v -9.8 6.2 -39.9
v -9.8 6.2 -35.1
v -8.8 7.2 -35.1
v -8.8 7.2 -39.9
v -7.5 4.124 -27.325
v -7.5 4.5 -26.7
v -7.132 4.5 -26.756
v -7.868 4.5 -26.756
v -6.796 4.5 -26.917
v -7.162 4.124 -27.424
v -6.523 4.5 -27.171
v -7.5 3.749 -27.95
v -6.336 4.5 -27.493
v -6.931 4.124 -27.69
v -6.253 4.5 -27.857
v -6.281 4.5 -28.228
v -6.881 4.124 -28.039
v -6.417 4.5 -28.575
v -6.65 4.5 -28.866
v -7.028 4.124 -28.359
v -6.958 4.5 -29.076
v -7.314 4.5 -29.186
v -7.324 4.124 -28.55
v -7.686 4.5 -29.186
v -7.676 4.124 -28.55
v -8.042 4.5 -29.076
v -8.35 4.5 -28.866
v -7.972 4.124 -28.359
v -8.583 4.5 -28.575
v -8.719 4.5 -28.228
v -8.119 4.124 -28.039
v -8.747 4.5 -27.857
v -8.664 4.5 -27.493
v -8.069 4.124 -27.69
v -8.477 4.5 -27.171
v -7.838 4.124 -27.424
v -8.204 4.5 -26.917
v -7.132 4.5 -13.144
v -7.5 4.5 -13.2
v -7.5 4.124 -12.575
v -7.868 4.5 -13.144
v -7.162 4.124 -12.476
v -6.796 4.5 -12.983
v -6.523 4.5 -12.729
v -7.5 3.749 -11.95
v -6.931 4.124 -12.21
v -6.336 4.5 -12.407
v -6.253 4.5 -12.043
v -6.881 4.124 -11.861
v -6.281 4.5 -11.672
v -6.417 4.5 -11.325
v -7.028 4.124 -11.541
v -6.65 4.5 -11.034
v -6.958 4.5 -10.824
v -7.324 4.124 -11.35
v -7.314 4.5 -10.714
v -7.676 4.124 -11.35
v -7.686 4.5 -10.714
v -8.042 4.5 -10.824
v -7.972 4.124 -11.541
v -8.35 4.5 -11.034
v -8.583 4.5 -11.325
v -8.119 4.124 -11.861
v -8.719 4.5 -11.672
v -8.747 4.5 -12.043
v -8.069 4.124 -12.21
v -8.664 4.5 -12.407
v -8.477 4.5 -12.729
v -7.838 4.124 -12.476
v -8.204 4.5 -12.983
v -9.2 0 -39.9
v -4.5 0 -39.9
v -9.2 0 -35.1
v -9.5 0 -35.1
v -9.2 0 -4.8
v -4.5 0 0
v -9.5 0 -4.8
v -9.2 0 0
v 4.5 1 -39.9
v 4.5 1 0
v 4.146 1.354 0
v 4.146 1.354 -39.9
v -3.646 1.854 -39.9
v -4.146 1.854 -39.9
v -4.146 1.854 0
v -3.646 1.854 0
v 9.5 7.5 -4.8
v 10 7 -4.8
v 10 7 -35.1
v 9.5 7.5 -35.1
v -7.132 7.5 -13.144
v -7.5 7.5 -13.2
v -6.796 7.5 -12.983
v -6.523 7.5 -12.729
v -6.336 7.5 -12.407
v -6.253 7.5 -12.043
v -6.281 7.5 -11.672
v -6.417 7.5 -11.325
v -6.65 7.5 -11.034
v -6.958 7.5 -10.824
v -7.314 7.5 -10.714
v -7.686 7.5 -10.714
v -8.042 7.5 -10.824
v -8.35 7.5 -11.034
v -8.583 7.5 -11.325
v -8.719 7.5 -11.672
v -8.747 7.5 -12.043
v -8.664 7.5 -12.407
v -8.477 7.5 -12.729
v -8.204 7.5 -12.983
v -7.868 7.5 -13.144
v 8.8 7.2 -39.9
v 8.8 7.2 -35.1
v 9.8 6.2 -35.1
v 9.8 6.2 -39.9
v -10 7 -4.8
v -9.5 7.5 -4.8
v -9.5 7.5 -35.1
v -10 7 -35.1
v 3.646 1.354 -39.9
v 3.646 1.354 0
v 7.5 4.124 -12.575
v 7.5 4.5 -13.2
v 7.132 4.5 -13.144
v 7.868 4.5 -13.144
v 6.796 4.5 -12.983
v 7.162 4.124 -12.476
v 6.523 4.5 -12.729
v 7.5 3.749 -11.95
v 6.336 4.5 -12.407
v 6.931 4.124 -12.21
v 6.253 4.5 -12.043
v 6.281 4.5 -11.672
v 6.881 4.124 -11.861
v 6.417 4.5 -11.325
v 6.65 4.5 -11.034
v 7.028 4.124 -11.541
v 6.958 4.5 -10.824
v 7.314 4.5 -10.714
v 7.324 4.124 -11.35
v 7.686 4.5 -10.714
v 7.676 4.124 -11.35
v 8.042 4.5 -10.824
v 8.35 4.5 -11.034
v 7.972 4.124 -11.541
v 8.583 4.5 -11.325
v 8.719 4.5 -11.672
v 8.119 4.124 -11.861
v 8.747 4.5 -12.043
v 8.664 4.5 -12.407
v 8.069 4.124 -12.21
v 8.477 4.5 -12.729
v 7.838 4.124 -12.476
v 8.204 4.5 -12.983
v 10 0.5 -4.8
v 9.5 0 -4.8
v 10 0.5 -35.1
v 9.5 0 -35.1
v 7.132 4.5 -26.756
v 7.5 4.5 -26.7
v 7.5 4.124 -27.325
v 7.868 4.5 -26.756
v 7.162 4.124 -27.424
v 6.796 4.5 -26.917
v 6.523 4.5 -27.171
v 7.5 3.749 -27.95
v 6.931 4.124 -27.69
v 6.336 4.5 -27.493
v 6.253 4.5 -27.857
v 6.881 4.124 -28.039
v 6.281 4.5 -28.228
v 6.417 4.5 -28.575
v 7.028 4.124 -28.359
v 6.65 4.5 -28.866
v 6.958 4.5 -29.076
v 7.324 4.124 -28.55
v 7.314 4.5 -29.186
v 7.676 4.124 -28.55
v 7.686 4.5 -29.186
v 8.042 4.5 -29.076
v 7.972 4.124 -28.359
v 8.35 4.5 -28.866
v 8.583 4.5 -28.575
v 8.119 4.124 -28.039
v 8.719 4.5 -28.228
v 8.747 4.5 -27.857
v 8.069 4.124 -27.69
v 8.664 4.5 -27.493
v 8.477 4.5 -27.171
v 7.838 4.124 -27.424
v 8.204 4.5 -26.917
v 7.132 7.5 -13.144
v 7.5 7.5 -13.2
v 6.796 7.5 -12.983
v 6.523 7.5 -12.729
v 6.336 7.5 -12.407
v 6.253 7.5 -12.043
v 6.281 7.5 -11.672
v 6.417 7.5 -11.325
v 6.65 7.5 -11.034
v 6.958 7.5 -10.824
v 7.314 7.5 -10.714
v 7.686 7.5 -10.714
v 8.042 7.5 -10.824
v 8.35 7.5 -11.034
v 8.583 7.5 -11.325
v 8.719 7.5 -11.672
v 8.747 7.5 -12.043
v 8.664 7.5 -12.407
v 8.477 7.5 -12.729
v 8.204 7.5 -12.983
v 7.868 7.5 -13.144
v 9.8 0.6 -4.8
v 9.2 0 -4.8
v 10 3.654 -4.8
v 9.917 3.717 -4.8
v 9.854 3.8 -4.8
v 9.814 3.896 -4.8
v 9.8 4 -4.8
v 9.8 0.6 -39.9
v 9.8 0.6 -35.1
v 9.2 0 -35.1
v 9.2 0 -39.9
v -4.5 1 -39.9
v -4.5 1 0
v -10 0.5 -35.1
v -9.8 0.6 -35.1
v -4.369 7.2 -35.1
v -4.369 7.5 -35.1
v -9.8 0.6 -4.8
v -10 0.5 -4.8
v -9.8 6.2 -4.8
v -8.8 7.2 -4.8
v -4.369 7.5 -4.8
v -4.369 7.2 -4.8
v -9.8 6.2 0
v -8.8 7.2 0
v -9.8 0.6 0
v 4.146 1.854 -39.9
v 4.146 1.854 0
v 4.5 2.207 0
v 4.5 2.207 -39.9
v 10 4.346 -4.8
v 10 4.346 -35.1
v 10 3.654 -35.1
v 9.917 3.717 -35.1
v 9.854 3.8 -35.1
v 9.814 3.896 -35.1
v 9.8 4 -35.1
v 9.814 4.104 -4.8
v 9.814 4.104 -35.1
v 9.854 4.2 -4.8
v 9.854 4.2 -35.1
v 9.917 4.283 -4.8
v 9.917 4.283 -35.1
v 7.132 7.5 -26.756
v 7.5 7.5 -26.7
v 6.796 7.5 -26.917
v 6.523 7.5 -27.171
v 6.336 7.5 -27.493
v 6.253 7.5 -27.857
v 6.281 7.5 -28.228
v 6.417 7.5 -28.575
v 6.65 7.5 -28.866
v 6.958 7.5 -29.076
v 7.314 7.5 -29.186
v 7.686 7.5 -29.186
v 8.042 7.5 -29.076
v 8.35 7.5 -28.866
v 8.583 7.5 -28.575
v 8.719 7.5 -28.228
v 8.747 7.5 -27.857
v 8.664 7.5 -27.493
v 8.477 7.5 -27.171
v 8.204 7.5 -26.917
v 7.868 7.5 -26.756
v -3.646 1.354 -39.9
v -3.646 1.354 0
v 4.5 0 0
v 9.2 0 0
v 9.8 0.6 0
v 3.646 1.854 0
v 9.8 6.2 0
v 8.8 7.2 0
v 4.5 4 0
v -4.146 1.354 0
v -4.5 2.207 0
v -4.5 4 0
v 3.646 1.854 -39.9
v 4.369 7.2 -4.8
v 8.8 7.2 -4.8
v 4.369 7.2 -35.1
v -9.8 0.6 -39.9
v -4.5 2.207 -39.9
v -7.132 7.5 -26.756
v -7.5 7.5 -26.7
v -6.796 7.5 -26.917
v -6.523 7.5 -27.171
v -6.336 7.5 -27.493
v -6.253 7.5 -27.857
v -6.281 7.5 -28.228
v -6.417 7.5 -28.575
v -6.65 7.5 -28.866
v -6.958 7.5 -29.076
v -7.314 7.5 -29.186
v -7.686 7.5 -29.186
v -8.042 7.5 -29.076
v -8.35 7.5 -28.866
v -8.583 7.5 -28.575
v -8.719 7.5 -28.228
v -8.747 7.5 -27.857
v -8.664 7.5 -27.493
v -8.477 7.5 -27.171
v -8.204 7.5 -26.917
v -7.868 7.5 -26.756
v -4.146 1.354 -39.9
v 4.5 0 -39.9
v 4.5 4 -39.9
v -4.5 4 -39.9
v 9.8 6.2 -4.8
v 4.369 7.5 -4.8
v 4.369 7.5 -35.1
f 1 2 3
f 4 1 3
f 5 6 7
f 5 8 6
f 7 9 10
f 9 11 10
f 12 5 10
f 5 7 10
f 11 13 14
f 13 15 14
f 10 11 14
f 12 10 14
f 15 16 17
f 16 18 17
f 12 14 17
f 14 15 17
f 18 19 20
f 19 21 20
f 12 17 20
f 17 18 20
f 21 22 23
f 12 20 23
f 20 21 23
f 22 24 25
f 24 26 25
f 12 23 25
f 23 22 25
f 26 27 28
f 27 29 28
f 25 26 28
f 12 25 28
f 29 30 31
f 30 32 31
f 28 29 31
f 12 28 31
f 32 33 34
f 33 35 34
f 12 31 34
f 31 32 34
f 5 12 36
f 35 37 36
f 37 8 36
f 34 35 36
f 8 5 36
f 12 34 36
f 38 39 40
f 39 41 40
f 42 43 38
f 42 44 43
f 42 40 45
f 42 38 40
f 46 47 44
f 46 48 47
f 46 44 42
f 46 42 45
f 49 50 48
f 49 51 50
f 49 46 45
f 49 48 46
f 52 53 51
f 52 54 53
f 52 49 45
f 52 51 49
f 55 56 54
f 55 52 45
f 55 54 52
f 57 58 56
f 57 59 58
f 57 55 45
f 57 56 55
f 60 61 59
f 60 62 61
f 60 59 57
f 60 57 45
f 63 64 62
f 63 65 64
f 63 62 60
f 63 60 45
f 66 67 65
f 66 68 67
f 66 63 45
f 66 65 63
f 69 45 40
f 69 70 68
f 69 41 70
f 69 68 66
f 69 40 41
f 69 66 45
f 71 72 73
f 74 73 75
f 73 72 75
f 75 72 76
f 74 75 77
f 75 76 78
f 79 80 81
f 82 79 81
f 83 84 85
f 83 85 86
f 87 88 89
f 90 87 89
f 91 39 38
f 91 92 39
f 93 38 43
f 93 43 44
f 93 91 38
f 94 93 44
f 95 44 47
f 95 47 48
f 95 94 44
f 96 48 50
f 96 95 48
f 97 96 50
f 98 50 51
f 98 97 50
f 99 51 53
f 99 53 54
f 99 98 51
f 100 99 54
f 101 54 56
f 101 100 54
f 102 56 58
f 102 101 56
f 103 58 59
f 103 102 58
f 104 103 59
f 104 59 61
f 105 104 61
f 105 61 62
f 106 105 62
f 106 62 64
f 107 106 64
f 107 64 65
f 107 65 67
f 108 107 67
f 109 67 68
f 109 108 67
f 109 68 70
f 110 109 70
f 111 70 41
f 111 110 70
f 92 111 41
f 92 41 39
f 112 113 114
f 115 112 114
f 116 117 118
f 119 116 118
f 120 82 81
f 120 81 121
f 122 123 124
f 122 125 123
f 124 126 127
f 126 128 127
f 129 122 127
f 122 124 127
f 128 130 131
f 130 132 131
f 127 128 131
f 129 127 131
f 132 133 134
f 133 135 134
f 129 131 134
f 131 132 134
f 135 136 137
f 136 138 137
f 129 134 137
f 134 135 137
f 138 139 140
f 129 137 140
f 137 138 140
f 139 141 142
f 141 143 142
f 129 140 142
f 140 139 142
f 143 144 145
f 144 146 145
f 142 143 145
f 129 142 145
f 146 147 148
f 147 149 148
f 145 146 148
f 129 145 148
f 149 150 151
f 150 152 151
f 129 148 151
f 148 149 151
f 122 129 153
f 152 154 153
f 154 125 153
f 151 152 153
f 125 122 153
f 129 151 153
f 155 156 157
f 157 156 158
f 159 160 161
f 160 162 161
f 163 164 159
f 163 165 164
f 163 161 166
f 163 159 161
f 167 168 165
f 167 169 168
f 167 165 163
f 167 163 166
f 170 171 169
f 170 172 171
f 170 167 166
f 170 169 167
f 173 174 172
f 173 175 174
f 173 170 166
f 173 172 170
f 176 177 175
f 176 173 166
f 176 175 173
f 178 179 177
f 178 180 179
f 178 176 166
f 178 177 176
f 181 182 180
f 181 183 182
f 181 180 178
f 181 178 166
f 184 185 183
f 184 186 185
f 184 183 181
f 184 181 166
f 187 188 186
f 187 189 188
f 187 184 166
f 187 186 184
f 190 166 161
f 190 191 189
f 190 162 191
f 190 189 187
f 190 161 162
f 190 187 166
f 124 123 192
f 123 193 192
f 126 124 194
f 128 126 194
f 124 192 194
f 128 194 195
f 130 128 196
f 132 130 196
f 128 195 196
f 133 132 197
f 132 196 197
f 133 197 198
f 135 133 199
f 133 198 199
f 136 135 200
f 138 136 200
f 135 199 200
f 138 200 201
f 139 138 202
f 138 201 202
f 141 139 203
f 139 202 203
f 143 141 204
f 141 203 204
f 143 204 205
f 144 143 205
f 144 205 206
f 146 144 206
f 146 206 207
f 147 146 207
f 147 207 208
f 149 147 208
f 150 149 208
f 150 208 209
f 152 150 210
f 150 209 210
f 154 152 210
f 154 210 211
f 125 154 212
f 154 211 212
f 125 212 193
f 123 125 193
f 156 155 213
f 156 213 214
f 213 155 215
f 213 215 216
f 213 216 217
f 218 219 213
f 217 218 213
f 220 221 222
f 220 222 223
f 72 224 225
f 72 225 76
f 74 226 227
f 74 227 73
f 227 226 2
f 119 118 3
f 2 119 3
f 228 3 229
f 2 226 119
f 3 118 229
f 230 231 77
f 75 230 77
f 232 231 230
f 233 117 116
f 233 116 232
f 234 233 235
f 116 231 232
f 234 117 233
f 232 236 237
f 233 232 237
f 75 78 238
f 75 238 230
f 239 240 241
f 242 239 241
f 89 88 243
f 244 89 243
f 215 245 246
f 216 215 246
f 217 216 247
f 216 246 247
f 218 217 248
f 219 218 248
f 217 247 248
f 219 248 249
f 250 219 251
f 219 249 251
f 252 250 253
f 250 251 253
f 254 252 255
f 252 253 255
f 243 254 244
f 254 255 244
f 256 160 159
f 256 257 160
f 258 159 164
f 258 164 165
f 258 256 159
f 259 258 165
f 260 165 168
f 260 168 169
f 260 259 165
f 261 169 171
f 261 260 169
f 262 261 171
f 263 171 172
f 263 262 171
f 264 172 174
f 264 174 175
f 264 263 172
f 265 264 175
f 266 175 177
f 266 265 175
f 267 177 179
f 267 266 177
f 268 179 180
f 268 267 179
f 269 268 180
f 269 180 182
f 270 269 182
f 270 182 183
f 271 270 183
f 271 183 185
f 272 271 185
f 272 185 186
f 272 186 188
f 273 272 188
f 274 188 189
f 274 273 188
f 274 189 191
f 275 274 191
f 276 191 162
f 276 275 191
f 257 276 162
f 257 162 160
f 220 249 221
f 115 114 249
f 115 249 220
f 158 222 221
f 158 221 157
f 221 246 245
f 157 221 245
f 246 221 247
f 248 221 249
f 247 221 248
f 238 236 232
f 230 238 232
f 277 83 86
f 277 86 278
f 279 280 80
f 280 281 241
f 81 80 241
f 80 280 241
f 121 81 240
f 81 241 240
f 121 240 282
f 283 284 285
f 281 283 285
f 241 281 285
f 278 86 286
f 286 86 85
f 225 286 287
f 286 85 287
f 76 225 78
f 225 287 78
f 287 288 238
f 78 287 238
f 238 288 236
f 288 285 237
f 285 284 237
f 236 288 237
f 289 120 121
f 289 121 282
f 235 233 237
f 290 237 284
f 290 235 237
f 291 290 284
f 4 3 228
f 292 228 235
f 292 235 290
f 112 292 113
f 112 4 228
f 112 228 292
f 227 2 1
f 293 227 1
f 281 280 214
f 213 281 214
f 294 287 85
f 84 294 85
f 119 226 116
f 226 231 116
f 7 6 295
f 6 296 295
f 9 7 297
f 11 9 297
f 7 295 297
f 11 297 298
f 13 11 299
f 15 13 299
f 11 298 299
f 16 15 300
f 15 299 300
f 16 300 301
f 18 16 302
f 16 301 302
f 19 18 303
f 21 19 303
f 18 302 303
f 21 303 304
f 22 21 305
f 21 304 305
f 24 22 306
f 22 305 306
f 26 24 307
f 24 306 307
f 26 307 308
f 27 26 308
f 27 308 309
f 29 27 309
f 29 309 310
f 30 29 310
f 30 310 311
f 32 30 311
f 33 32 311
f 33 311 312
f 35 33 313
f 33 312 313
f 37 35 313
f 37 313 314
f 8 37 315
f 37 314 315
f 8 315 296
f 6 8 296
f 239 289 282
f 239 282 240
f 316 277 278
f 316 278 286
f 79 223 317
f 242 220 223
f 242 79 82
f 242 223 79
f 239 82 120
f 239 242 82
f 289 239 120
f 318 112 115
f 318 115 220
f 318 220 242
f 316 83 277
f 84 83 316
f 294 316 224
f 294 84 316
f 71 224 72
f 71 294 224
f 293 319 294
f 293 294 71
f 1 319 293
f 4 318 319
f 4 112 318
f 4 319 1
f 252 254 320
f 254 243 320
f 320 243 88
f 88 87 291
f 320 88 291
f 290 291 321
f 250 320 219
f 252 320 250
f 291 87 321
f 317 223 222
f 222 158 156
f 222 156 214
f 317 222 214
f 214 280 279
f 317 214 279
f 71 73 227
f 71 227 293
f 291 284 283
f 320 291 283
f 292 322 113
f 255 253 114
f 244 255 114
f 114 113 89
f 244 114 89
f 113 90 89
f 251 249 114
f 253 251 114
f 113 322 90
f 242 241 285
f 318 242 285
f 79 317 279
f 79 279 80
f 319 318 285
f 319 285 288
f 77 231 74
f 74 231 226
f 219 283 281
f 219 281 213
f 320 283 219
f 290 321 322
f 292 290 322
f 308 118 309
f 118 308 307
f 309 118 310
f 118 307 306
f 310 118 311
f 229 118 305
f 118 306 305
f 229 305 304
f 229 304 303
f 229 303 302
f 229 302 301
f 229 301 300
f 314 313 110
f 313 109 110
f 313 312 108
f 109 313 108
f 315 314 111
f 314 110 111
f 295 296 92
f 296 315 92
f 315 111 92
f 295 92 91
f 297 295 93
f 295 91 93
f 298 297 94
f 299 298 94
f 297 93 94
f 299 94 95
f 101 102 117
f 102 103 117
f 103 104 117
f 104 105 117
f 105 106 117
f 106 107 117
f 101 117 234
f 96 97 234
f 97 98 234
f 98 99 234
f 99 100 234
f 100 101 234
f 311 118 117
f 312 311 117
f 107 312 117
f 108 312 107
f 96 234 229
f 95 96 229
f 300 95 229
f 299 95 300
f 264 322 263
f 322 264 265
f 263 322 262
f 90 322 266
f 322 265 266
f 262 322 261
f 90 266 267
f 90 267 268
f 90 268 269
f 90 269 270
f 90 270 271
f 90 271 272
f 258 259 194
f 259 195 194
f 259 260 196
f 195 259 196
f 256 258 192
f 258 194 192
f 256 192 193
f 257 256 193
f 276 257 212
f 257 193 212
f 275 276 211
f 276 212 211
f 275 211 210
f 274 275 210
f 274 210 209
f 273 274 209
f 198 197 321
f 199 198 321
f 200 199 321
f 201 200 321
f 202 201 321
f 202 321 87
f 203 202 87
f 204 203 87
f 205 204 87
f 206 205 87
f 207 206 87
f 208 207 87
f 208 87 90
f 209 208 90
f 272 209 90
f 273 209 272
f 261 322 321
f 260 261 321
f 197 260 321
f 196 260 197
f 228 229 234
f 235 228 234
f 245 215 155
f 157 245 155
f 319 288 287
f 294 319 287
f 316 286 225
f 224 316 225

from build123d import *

# Parameters (mm, degrees)
EXTRUDE_1_DEPTH     = 39.9
CHAMFER_1_SIZE      = 0.5
CUT_EXTRUDE_1_DEPTH = 0.3
SKETCH_6_W          = 0.2
SKETCH_6_H          = 4.8
CUT_EXTRUDE_2_DEPTH = 8.3
CHAMFER_2_SIZE      = 1
CHAMFER_3_SIZE      = 0.6
CHAMFER_4_SIZE      = 0.5
SKETCH_7_R          = 0.4
CUT_EXTRUDE_3_DEPTH = 30.3


with BuildPart() as part:
    # 草图1 → 凸台-拉伸1 (new body)
    with BuildSketch(Plane.XY):
        Polygon((-10, 0), (-10, 7.5), (10, 7.5), (10, 0), (4.5, 0), (4.5, 1), (4.146446609, 1.353553391), (3.646446609, 1.353553391), (3.646446609, 1.853553391), (4.146446609, 1.853553391), (4.5, 2.207106781), (4.5, 4), (-4.5, 4), (-4.5, 2.207106781), (-4.146446609, 1.853553391), (-3.646446609, 1.853553391), (-3.646446609, 1.353553391), (-4.146446609, 1.353553391), (-4.5, 1), (-4.5, 0), align=None)
    extrude(amount=-EXTRUDE_1_DEPTH)

    # 草图3 → M3 螺纹孔1 (revolve, cut)
    with BuildSketch(Plane(origin=(7.5, 7.5, -27.95), x_dir=(0, 0, 1), z_dir=(1, 0, 0))):
        Polygon((0, 0), (0, 3.751075774), (1.25, 3), (1.25, 0), align=None)
    hole_wizard_m3_1 = revolve(axis=Axis((7.5, 13.85, -27.95), (0, -1, 0)), mode=Mode.SUBTRACT)

    # 镜向1: M3 螺纹孔1 across plane
    add(hole_wizard_m3_1.mirror(Plane(origin=(0, 0, -19.95), x_dir=(1, 0, 0), z_dir=(0, 0, -1))), mode=Mode.SUBTRACT)

    # 镜向2: M3 螺纹孔1 across plane
    add(hole_wizard_m3_1.mirror(Plane.ZY), mode=Mode.SUBTRACT)

    # 镜向2 copy 1 sketch → 镜向2 copy 1 (revolve, cut)
    with BuildSketch(Plane(origin=(-7.5, 7.5, -11.95), x_dir=(0, 0, -1), z_dir=(-1, 0, 0))):
        Polygon((0, 0), (0, 3.751075774), (1.25, 3), (1.25, 0), align=None)
    revolve(axis=Axis((-7.5, 13.85, -11.95), (0, -1, 0)), mode=Mode.SUBTRACT)

    # 倒角1
    chamfer_1_edges = [part.edges().sort_by_distance(p)[0] for p in [
        (10, 7.5, -19.95),
        (-10, 7.5, -19.95),
    ]]
    chamfer(chamfer_1_edges, length=CHAMFER_1_SIZE)

    # 草图5 → 切除-拉伸1 (cut)
    with BuildSketch(Plane(origin=(0, 7.5, 0), x_dir=(1, 0, 0), z_dir=(0, 1, 0))):
        Polygon((-9.5, 35.1), (-4.368581018, 35.1), (-4.368581018, 4.8), (-9.5, 4.8), (-10, 4.8), (-10, 0), (10, 0), (10, 4.8), (9.5, 4.8), (4.368581018, 4.8), (4.368581018, 35.1), (9.5, 35.1), (10, 35.1), (10, 39.9), (-10, 39.9), (-10, 35.1), align=None)
    extrude(amount=-CUT_EXTRUDE_1_DEPTH, mode=Mode.SUBTRACT)

    # 草图6 → 切除-拉伸2 (cut)
    with BuildSketch(Plane(origin=(0, 7.2, 0), x_dir=(1, 0, 0), z_dir=(0, 1, 0))):
        with Locations((-9.9, 37.5)):
            Rectangle(SKETCH_6_W, SKETCH_6_H)
        with Locations((9.9, 37.5)):
            Rectangle(SKETCH_6_W, SKETCH_6_H)
        with Locations((9.9, 2.4)):
            Rectangle(SKETCH_6_W, SKETCH_6_H)
        with Locations((-9.9, 2.4)):
            Rectangle(SKETCH_6_W, SKETCH_6_H)
    extrude(amount=-CUT_EXTRUDE_2_DEPTH, mode=Mode.SUBTRACT)

    # 倒角2
    # the kernel refuses this chamfer: 1 mm, written as the material it takes off along each edge
    with BuildSketch(Plane(origin=(-9.8, 7.2, -4.8), x_dir=(-0.027495876610583895, -0.9996219169112968, 0), z_dir=(0, 0, 1)), Plane(origin=(-9.8, 7.2, -42.471682988), x_dir=(-0.027495876610585623, -0.9996219169112968, 0), z_dir=(0, 0, 1))) as chamfer_2_piece_1:
        Polygon((CHAMFER_2_SIZE * 0.999621916911, CHAMFER_2_SIZE * 0.0274958766106), (-CHAMFER_2_SIZE * 0.0274958766106, CHAMFER_2_SIZE * 0.999621916911), (0, 0), align=None)
    extrude(amount=7.371682988, mode=Mode.SUBTRACT)
    with BuildSketch(Plane(origin=(9.8, 7.2, 2.571682988), x_dir=(-0.9996219169112968, 0.02749587661058651, 0), z_dir=(0, 0, -1)), Plane(origin=(9.8, 7.2, -35.1), x_dir=(-0.9996219169112968, 0.02749587661058651, 0), z_dir=(0, 0, -1))) as chamfer_2_piece_2:
        Polygon((CHAMFER_2_SIZE * 0.999621916911, -CHAMFER_2_SIZE * 0.0274958766106), (-CHAMFER_2_SIZE * 0.0274958766106, -CHAMFER_2_SIZE * 0.999621916911), (0, 0), align=None)
    extrude(amount=7.371682988, mode=Mode.SUBTRACT)

    # 倒角3
    chamfer_3_edges = [part.edges().sort_by_distance(p)[0] for p in [
        (-9.8, 0, -37.5),
        (9.8, 0, -37.5),
        (9.8, 0, -2.4),
        (-9.8, 0, -2.4),
    ]]
    chamfer(chamfer_3_edges, length=CHAMFER_3_SIZE)

    # 倒角4
    chamfer_4_edges = [part.edges().sort_by_distance(p)[0] for p in [
        (-10, 0, -19.95),
        (10, 0, -19.95),
    ]]
    chamfer(chamfer_4_edges, length=CHAMFER_4_SIZE)

    # 草图7 → 切除-拉伸3 (cut)
    with BuildSketch(Plane(origin=(0, 0, -35.1), x_dir=(-1, 0, 0), z_dir=(0, 0, -1))):
        with Locations((-10.2, 4)):
            Circle(SKETCH_7_R)
    extrude(amount=-CUT_EXTRUDE_3_DEPTH, mode=Mode.SUBTRACT)


solid = part.part
